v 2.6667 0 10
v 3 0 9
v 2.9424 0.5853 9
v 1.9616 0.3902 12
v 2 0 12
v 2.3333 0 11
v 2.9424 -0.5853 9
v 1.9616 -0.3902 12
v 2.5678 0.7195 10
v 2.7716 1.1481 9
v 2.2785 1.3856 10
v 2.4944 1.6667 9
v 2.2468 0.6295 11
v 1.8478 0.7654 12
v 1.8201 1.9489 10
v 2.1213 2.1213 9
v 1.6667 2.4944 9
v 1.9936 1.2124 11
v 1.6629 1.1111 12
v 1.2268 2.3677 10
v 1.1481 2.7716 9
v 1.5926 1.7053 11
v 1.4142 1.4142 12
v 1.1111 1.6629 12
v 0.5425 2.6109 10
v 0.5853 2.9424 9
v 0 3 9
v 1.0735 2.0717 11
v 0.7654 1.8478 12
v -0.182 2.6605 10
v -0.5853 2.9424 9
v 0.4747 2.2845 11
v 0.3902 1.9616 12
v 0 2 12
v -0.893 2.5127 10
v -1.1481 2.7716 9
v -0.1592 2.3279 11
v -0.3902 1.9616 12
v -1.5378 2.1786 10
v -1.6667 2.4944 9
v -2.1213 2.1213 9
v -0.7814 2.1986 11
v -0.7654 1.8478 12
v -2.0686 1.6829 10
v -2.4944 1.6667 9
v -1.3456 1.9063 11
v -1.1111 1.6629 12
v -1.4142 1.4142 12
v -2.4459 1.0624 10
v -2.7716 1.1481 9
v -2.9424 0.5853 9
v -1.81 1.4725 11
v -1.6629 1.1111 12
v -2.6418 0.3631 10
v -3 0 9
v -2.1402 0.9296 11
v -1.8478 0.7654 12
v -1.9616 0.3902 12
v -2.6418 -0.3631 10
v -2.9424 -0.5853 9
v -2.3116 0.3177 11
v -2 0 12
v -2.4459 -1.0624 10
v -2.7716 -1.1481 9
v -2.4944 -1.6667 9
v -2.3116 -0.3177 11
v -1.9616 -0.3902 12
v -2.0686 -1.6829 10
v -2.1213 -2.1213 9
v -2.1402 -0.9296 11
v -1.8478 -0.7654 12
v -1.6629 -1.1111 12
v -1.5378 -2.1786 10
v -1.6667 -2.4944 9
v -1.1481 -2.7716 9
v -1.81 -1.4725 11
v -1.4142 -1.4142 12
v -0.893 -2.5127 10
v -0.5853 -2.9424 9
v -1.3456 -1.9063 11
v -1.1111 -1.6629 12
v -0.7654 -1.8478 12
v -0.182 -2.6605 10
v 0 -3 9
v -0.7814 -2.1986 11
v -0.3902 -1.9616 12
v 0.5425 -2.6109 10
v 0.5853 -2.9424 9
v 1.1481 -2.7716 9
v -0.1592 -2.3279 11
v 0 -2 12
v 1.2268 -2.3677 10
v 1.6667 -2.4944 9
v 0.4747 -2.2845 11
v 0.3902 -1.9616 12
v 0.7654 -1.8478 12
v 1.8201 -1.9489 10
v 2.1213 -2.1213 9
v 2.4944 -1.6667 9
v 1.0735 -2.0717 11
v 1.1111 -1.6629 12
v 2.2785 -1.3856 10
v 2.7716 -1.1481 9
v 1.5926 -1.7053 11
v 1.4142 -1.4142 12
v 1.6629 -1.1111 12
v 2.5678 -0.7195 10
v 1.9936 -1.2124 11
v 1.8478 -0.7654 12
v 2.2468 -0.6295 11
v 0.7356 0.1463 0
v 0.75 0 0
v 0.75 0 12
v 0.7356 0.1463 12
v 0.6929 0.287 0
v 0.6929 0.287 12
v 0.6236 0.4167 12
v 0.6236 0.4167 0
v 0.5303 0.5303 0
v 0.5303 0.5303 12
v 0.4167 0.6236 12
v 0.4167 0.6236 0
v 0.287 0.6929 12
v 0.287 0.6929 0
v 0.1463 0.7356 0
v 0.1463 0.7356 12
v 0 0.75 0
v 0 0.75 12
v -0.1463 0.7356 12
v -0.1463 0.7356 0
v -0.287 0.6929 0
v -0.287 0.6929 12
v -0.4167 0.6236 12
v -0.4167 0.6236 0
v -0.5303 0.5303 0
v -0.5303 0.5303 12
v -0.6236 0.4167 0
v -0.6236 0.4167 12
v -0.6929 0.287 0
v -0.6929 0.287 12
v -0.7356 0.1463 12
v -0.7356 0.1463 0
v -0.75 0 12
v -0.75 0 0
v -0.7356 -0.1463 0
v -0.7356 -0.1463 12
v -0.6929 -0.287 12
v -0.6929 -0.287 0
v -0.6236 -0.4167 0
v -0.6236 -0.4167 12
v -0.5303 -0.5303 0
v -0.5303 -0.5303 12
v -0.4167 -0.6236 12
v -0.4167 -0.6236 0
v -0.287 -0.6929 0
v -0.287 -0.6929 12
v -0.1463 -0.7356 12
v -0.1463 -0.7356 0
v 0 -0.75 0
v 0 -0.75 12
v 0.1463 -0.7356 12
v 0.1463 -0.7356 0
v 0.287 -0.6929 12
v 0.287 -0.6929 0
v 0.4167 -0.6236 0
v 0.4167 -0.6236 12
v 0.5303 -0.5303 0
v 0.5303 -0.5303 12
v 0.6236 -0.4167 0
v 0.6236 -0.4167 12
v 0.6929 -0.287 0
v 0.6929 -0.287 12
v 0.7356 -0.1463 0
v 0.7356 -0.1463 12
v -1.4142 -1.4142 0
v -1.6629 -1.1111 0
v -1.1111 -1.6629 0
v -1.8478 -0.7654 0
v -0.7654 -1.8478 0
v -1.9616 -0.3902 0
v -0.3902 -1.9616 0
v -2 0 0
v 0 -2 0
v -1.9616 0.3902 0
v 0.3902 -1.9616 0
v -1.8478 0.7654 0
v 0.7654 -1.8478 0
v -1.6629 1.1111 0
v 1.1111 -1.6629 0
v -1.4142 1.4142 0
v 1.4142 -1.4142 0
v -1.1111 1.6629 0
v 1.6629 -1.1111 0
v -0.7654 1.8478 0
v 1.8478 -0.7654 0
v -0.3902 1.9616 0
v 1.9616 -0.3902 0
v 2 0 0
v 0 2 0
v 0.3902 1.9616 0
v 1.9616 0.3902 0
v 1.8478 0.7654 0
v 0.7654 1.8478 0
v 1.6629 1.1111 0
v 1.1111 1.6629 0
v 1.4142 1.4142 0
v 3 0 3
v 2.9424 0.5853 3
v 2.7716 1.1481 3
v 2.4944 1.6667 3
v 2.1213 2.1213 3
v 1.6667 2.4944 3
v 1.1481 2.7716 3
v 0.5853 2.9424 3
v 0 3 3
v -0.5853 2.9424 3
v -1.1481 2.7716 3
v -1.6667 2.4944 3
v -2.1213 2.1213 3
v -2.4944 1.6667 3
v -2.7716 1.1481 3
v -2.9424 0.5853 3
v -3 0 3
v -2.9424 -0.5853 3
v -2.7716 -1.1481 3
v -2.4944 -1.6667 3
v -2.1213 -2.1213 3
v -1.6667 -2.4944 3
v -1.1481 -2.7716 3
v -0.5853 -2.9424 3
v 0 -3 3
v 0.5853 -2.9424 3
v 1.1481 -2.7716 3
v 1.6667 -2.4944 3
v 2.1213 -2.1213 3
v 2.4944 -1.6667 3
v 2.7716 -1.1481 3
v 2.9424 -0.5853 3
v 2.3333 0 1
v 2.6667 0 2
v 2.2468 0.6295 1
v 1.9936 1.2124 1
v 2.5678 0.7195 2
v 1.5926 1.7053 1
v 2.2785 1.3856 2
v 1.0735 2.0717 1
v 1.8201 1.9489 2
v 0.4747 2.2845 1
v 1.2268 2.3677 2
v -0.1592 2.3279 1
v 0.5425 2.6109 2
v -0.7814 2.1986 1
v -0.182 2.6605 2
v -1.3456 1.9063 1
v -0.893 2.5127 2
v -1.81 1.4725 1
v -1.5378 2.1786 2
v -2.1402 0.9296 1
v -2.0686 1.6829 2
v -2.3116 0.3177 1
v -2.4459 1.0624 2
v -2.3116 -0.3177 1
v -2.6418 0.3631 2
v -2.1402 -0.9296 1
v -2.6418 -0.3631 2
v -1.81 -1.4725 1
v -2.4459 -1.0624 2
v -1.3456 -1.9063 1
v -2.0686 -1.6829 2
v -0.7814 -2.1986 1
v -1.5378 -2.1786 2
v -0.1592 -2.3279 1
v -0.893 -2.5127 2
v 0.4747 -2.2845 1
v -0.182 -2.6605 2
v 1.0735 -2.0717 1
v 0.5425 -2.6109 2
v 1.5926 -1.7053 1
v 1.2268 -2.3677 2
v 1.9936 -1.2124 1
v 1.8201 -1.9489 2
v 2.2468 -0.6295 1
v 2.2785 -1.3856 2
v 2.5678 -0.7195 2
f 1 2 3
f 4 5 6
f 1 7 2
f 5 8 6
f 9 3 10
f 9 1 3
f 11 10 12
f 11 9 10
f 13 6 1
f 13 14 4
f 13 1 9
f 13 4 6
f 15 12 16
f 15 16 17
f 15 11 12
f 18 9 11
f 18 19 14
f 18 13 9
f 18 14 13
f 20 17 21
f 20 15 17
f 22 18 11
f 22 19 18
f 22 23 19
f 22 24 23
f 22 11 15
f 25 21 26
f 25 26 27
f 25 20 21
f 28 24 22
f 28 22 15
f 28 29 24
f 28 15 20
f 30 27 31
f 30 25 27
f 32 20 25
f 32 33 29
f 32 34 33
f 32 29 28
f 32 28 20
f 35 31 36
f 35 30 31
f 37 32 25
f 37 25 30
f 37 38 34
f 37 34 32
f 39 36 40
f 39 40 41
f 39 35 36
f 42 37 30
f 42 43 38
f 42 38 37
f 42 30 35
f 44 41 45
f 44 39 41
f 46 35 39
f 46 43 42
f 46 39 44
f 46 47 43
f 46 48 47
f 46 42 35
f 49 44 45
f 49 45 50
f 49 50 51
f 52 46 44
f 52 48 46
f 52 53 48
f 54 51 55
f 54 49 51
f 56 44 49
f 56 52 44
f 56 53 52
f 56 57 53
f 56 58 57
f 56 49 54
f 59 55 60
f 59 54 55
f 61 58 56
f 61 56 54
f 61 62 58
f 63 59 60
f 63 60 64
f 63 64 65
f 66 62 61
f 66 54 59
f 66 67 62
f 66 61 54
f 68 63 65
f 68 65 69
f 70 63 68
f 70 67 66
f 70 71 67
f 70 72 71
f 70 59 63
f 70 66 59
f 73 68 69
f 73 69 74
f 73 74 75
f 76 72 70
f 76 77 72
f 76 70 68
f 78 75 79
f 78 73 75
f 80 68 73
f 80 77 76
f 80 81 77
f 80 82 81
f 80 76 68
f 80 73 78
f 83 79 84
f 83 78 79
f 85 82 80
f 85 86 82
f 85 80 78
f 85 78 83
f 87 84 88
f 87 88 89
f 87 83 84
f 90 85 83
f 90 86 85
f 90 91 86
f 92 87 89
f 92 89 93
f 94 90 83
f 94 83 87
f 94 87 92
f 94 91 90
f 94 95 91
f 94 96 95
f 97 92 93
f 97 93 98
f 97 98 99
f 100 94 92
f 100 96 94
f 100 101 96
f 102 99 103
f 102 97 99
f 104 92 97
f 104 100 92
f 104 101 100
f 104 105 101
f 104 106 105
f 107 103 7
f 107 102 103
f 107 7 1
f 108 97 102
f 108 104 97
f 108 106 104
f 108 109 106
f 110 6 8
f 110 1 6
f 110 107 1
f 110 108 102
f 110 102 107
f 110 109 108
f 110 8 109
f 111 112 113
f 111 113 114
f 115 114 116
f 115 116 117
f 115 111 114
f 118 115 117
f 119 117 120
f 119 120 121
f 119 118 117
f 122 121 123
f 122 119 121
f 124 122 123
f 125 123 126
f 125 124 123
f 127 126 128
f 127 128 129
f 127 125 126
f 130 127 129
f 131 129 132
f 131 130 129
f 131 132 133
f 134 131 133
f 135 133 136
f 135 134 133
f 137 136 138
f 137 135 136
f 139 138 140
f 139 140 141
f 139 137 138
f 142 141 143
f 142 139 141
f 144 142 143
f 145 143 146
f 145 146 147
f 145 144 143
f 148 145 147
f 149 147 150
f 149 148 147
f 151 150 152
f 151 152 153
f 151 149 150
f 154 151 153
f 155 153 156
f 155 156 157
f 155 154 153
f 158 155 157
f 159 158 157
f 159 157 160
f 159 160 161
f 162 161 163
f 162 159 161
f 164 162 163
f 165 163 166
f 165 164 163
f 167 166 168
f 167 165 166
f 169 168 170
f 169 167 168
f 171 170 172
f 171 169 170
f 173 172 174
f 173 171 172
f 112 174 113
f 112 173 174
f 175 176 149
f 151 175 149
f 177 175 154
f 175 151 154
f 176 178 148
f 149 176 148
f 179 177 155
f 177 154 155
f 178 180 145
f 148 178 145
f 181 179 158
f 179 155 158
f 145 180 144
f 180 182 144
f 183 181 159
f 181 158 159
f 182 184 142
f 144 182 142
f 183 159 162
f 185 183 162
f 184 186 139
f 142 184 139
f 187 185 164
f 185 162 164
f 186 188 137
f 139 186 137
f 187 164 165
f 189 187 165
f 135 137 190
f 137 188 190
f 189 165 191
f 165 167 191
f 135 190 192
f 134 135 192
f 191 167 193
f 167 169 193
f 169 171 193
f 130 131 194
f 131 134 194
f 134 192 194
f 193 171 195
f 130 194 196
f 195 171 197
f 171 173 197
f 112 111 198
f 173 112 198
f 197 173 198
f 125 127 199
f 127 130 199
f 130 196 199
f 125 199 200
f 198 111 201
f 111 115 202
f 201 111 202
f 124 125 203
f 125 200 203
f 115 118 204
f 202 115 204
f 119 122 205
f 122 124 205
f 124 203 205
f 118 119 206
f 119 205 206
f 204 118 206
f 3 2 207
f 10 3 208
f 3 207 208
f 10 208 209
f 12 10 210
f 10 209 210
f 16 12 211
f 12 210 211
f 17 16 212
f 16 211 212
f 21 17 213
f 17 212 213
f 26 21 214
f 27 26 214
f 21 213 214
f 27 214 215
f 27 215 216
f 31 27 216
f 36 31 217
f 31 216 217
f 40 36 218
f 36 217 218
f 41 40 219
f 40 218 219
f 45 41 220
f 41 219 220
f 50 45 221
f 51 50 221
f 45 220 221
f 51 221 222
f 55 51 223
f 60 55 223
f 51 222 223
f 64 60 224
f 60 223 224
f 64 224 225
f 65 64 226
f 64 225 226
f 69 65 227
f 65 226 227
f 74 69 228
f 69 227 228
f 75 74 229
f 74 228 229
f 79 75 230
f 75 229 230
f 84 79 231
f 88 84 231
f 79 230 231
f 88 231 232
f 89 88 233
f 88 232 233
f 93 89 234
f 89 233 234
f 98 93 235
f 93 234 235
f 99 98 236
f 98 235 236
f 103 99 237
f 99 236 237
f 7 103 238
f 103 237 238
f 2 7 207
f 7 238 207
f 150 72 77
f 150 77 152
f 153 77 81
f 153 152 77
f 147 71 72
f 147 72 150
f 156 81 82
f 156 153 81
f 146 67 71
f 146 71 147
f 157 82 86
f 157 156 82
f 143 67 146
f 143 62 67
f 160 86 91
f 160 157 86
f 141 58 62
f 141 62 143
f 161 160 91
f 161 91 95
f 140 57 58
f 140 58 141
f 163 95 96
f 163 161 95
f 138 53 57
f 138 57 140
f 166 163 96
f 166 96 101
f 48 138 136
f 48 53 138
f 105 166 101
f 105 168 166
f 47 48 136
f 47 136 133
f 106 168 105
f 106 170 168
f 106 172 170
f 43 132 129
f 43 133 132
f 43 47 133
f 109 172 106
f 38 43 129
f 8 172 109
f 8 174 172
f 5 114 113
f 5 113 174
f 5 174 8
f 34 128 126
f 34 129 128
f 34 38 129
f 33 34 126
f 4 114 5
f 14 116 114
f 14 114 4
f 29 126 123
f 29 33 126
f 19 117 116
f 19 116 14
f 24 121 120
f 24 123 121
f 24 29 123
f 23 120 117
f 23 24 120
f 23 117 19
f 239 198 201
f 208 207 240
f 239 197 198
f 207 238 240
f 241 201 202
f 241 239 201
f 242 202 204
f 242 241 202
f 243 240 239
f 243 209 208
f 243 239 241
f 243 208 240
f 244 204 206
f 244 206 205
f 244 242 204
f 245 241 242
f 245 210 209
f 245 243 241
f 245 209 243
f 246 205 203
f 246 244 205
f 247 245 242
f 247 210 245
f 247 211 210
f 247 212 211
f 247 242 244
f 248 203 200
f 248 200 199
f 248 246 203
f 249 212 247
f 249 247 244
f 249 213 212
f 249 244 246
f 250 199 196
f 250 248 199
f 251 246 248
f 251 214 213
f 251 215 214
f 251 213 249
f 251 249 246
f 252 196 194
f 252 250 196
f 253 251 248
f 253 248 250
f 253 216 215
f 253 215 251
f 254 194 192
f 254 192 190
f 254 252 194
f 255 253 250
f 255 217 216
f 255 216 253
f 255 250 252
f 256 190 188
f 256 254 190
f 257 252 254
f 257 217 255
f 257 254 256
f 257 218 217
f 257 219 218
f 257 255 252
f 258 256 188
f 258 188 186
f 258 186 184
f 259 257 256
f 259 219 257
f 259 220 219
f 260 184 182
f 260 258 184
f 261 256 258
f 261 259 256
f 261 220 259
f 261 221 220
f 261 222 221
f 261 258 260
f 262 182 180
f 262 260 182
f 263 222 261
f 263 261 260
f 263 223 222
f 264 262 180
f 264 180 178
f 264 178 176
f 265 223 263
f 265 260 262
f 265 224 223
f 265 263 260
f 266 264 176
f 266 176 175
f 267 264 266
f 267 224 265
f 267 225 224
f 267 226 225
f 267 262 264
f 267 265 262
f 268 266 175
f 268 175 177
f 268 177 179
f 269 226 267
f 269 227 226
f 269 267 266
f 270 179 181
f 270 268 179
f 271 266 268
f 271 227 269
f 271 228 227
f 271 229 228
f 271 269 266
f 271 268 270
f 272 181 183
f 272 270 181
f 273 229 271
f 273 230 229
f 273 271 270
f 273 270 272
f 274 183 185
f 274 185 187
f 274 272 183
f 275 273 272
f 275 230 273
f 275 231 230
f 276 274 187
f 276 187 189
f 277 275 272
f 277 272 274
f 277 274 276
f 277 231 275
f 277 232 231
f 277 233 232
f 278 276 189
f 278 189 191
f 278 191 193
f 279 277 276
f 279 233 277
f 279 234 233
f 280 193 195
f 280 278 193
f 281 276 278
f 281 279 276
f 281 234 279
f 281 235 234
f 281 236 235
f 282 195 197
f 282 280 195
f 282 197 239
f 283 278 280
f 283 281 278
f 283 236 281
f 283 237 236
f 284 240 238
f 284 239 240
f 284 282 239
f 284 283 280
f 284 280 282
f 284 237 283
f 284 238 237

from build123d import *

# Parameters (mm, degrees)
ESQUISSE1_R        = 3
ESQUISSE1_R_2      = 0.75
BOSS_EXTRU_1_DEPTH = 12
CHANFREIN1_SIZE    = 3
CHANFREIN1_SIZE2   = 1
CHANFREIN2_SIZE    = 1
CHANFREIN2_SIZE2   = 3


with BuildPart() as part:
    # Esquisse1 → Boss.-Extru.1 (new body)
    with BuildSketch(Plane.XY):
        Circle(ESQUISSE1_R)
        Circle(ESQUISSE1_R_2, mode=Mode.SUBTRACT)
    extrude(amount=BOSS_EXTRU_1_DEPTH)

    # Chanfrein1
    chanfrein1_edges = [part.edges().sort_by_distance(p)[0] for p in [
        (-3, 0, 12),
    ]]
    chanfrein1_side = [part.faces().sort_by_distance(p)[0] for p in [
        (-3, 0, 6),
    ]]
    chamfer(chanfrein1_edges, length=CHANFREIN1_SIZE, length2=CHANFREIN1_SIZE2, reference=chanfrein1_side[0])

    # Chanfrein2
    chanfrein2_edges = [part.edges().sort_by_distance(p)[0] for p in [
        (-3, 0, 0),
    ]]
    chanfrein2_side = [part.faces().sort_by_distance(p)[0] for p in [
        (-2.915147186, 0, 0),
    ]]
    chamfer(chanfrein2_edges, length=CHANFREIN2_SIZE, length2=CHANFREIN2_SIZE2, reference=chanfrein2_side[0])


solid = part.part
